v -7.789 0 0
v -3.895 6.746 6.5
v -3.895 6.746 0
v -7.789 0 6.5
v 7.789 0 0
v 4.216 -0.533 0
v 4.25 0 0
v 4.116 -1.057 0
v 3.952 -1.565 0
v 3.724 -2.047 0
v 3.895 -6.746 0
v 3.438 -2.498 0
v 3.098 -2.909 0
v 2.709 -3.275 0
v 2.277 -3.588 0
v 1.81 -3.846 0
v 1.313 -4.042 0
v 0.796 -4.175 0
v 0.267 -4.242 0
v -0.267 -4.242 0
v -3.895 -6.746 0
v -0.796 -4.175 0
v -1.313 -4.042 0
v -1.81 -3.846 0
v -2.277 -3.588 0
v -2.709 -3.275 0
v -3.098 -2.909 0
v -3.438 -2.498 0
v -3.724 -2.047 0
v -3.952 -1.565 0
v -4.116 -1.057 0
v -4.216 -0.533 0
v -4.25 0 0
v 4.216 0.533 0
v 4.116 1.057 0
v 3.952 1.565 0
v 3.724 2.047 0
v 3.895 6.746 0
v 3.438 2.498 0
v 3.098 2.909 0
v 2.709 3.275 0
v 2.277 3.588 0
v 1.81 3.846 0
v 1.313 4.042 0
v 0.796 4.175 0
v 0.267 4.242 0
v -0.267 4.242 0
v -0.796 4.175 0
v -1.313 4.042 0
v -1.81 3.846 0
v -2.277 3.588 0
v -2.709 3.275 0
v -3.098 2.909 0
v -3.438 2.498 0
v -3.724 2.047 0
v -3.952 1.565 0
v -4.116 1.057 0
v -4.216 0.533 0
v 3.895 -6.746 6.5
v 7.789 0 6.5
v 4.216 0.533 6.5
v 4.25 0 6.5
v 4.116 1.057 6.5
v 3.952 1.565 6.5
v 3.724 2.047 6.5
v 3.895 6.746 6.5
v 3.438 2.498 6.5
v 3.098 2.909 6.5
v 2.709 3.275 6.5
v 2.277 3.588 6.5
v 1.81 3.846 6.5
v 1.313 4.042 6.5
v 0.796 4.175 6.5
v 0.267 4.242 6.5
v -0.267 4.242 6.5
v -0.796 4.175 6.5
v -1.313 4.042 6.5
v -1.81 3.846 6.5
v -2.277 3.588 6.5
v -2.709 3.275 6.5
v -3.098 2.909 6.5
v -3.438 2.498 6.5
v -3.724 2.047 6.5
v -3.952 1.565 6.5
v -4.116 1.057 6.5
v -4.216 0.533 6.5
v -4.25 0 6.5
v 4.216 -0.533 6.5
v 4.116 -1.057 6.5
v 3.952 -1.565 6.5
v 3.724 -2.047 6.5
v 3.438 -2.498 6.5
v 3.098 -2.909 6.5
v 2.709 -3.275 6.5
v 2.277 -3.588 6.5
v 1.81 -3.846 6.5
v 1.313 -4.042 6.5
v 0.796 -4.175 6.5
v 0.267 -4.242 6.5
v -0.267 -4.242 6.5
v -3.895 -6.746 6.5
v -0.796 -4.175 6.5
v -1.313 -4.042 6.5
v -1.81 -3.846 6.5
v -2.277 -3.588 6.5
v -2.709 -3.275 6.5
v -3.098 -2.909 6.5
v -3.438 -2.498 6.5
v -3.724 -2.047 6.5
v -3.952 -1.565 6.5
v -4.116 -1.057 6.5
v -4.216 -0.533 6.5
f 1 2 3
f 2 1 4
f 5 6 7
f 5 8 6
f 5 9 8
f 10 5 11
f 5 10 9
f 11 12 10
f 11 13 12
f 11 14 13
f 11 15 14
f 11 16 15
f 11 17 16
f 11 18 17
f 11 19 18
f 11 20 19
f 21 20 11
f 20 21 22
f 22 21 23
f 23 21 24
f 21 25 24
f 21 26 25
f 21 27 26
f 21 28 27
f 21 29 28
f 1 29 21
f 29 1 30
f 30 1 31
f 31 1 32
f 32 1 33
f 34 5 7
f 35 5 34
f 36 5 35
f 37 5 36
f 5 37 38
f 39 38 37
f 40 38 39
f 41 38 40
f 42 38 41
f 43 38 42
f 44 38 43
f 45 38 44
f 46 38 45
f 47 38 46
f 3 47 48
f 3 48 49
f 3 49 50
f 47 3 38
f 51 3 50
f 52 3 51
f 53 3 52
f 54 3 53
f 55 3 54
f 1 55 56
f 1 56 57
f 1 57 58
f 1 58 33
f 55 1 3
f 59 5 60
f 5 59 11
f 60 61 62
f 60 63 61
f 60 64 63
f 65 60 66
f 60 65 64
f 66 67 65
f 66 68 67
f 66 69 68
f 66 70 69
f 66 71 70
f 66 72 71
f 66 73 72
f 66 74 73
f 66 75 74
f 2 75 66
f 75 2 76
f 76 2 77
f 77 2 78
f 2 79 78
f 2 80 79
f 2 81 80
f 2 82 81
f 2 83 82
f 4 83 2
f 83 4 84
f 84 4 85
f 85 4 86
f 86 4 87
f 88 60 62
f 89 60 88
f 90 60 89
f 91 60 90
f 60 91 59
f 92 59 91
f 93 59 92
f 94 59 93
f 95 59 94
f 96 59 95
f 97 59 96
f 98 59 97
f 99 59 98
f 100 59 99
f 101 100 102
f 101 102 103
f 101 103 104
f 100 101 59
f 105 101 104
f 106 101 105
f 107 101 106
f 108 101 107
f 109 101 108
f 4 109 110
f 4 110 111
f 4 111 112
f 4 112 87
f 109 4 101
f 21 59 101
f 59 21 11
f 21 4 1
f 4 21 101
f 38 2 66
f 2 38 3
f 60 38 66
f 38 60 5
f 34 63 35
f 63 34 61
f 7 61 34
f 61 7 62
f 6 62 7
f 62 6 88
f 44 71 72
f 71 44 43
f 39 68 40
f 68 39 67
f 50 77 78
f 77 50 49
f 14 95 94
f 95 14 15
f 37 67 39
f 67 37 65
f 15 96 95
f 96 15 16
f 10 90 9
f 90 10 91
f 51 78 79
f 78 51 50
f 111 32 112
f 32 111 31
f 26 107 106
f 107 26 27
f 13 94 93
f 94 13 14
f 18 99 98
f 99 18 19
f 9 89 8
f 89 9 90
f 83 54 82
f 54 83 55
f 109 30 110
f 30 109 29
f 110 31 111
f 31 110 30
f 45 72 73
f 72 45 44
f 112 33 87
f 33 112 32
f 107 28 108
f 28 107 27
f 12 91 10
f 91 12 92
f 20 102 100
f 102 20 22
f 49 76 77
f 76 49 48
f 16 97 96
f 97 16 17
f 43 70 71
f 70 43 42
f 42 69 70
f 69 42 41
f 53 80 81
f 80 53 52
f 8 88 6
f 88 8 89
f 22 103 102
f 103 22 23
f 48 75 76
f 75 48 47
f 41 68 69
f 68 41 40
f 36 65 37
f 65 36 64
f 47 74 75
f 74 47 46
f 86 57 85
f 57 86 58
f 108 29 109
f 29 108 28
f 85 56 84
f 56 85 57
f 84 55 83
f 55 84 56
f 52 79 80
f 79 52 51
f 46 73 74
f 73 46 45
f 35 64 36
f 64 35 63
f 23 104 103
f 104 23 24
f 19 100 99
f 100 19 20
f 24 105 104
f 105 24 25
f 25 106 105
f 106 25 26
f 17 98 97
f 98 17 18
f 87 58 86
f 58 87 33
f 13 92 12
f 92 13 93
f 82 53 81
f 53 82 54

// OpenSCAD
$fn = 50;


difference() {
	union() {
		translate(v = [0, 0, 0]) {
			rotate(a = [0, 0, 0]) {
				difference() {
					union() {
						linear_extrude(height = 6.5000000000) {
							polygon(points = [[7.7895000000, 0.0000000000], [3.8947500000, 6.7459048828], [-3.8947500000, 6.7459048828], [-7.7895000000, 0.0000000000], [-3.8947500000, -6.7459048828], [3.8947500000, -6.7459048828]]);
						}
					}
					union();
				}
			}
		}
	}
	union() {
		cylinder(h = 100, r = 4.2500000000);
	}
}
